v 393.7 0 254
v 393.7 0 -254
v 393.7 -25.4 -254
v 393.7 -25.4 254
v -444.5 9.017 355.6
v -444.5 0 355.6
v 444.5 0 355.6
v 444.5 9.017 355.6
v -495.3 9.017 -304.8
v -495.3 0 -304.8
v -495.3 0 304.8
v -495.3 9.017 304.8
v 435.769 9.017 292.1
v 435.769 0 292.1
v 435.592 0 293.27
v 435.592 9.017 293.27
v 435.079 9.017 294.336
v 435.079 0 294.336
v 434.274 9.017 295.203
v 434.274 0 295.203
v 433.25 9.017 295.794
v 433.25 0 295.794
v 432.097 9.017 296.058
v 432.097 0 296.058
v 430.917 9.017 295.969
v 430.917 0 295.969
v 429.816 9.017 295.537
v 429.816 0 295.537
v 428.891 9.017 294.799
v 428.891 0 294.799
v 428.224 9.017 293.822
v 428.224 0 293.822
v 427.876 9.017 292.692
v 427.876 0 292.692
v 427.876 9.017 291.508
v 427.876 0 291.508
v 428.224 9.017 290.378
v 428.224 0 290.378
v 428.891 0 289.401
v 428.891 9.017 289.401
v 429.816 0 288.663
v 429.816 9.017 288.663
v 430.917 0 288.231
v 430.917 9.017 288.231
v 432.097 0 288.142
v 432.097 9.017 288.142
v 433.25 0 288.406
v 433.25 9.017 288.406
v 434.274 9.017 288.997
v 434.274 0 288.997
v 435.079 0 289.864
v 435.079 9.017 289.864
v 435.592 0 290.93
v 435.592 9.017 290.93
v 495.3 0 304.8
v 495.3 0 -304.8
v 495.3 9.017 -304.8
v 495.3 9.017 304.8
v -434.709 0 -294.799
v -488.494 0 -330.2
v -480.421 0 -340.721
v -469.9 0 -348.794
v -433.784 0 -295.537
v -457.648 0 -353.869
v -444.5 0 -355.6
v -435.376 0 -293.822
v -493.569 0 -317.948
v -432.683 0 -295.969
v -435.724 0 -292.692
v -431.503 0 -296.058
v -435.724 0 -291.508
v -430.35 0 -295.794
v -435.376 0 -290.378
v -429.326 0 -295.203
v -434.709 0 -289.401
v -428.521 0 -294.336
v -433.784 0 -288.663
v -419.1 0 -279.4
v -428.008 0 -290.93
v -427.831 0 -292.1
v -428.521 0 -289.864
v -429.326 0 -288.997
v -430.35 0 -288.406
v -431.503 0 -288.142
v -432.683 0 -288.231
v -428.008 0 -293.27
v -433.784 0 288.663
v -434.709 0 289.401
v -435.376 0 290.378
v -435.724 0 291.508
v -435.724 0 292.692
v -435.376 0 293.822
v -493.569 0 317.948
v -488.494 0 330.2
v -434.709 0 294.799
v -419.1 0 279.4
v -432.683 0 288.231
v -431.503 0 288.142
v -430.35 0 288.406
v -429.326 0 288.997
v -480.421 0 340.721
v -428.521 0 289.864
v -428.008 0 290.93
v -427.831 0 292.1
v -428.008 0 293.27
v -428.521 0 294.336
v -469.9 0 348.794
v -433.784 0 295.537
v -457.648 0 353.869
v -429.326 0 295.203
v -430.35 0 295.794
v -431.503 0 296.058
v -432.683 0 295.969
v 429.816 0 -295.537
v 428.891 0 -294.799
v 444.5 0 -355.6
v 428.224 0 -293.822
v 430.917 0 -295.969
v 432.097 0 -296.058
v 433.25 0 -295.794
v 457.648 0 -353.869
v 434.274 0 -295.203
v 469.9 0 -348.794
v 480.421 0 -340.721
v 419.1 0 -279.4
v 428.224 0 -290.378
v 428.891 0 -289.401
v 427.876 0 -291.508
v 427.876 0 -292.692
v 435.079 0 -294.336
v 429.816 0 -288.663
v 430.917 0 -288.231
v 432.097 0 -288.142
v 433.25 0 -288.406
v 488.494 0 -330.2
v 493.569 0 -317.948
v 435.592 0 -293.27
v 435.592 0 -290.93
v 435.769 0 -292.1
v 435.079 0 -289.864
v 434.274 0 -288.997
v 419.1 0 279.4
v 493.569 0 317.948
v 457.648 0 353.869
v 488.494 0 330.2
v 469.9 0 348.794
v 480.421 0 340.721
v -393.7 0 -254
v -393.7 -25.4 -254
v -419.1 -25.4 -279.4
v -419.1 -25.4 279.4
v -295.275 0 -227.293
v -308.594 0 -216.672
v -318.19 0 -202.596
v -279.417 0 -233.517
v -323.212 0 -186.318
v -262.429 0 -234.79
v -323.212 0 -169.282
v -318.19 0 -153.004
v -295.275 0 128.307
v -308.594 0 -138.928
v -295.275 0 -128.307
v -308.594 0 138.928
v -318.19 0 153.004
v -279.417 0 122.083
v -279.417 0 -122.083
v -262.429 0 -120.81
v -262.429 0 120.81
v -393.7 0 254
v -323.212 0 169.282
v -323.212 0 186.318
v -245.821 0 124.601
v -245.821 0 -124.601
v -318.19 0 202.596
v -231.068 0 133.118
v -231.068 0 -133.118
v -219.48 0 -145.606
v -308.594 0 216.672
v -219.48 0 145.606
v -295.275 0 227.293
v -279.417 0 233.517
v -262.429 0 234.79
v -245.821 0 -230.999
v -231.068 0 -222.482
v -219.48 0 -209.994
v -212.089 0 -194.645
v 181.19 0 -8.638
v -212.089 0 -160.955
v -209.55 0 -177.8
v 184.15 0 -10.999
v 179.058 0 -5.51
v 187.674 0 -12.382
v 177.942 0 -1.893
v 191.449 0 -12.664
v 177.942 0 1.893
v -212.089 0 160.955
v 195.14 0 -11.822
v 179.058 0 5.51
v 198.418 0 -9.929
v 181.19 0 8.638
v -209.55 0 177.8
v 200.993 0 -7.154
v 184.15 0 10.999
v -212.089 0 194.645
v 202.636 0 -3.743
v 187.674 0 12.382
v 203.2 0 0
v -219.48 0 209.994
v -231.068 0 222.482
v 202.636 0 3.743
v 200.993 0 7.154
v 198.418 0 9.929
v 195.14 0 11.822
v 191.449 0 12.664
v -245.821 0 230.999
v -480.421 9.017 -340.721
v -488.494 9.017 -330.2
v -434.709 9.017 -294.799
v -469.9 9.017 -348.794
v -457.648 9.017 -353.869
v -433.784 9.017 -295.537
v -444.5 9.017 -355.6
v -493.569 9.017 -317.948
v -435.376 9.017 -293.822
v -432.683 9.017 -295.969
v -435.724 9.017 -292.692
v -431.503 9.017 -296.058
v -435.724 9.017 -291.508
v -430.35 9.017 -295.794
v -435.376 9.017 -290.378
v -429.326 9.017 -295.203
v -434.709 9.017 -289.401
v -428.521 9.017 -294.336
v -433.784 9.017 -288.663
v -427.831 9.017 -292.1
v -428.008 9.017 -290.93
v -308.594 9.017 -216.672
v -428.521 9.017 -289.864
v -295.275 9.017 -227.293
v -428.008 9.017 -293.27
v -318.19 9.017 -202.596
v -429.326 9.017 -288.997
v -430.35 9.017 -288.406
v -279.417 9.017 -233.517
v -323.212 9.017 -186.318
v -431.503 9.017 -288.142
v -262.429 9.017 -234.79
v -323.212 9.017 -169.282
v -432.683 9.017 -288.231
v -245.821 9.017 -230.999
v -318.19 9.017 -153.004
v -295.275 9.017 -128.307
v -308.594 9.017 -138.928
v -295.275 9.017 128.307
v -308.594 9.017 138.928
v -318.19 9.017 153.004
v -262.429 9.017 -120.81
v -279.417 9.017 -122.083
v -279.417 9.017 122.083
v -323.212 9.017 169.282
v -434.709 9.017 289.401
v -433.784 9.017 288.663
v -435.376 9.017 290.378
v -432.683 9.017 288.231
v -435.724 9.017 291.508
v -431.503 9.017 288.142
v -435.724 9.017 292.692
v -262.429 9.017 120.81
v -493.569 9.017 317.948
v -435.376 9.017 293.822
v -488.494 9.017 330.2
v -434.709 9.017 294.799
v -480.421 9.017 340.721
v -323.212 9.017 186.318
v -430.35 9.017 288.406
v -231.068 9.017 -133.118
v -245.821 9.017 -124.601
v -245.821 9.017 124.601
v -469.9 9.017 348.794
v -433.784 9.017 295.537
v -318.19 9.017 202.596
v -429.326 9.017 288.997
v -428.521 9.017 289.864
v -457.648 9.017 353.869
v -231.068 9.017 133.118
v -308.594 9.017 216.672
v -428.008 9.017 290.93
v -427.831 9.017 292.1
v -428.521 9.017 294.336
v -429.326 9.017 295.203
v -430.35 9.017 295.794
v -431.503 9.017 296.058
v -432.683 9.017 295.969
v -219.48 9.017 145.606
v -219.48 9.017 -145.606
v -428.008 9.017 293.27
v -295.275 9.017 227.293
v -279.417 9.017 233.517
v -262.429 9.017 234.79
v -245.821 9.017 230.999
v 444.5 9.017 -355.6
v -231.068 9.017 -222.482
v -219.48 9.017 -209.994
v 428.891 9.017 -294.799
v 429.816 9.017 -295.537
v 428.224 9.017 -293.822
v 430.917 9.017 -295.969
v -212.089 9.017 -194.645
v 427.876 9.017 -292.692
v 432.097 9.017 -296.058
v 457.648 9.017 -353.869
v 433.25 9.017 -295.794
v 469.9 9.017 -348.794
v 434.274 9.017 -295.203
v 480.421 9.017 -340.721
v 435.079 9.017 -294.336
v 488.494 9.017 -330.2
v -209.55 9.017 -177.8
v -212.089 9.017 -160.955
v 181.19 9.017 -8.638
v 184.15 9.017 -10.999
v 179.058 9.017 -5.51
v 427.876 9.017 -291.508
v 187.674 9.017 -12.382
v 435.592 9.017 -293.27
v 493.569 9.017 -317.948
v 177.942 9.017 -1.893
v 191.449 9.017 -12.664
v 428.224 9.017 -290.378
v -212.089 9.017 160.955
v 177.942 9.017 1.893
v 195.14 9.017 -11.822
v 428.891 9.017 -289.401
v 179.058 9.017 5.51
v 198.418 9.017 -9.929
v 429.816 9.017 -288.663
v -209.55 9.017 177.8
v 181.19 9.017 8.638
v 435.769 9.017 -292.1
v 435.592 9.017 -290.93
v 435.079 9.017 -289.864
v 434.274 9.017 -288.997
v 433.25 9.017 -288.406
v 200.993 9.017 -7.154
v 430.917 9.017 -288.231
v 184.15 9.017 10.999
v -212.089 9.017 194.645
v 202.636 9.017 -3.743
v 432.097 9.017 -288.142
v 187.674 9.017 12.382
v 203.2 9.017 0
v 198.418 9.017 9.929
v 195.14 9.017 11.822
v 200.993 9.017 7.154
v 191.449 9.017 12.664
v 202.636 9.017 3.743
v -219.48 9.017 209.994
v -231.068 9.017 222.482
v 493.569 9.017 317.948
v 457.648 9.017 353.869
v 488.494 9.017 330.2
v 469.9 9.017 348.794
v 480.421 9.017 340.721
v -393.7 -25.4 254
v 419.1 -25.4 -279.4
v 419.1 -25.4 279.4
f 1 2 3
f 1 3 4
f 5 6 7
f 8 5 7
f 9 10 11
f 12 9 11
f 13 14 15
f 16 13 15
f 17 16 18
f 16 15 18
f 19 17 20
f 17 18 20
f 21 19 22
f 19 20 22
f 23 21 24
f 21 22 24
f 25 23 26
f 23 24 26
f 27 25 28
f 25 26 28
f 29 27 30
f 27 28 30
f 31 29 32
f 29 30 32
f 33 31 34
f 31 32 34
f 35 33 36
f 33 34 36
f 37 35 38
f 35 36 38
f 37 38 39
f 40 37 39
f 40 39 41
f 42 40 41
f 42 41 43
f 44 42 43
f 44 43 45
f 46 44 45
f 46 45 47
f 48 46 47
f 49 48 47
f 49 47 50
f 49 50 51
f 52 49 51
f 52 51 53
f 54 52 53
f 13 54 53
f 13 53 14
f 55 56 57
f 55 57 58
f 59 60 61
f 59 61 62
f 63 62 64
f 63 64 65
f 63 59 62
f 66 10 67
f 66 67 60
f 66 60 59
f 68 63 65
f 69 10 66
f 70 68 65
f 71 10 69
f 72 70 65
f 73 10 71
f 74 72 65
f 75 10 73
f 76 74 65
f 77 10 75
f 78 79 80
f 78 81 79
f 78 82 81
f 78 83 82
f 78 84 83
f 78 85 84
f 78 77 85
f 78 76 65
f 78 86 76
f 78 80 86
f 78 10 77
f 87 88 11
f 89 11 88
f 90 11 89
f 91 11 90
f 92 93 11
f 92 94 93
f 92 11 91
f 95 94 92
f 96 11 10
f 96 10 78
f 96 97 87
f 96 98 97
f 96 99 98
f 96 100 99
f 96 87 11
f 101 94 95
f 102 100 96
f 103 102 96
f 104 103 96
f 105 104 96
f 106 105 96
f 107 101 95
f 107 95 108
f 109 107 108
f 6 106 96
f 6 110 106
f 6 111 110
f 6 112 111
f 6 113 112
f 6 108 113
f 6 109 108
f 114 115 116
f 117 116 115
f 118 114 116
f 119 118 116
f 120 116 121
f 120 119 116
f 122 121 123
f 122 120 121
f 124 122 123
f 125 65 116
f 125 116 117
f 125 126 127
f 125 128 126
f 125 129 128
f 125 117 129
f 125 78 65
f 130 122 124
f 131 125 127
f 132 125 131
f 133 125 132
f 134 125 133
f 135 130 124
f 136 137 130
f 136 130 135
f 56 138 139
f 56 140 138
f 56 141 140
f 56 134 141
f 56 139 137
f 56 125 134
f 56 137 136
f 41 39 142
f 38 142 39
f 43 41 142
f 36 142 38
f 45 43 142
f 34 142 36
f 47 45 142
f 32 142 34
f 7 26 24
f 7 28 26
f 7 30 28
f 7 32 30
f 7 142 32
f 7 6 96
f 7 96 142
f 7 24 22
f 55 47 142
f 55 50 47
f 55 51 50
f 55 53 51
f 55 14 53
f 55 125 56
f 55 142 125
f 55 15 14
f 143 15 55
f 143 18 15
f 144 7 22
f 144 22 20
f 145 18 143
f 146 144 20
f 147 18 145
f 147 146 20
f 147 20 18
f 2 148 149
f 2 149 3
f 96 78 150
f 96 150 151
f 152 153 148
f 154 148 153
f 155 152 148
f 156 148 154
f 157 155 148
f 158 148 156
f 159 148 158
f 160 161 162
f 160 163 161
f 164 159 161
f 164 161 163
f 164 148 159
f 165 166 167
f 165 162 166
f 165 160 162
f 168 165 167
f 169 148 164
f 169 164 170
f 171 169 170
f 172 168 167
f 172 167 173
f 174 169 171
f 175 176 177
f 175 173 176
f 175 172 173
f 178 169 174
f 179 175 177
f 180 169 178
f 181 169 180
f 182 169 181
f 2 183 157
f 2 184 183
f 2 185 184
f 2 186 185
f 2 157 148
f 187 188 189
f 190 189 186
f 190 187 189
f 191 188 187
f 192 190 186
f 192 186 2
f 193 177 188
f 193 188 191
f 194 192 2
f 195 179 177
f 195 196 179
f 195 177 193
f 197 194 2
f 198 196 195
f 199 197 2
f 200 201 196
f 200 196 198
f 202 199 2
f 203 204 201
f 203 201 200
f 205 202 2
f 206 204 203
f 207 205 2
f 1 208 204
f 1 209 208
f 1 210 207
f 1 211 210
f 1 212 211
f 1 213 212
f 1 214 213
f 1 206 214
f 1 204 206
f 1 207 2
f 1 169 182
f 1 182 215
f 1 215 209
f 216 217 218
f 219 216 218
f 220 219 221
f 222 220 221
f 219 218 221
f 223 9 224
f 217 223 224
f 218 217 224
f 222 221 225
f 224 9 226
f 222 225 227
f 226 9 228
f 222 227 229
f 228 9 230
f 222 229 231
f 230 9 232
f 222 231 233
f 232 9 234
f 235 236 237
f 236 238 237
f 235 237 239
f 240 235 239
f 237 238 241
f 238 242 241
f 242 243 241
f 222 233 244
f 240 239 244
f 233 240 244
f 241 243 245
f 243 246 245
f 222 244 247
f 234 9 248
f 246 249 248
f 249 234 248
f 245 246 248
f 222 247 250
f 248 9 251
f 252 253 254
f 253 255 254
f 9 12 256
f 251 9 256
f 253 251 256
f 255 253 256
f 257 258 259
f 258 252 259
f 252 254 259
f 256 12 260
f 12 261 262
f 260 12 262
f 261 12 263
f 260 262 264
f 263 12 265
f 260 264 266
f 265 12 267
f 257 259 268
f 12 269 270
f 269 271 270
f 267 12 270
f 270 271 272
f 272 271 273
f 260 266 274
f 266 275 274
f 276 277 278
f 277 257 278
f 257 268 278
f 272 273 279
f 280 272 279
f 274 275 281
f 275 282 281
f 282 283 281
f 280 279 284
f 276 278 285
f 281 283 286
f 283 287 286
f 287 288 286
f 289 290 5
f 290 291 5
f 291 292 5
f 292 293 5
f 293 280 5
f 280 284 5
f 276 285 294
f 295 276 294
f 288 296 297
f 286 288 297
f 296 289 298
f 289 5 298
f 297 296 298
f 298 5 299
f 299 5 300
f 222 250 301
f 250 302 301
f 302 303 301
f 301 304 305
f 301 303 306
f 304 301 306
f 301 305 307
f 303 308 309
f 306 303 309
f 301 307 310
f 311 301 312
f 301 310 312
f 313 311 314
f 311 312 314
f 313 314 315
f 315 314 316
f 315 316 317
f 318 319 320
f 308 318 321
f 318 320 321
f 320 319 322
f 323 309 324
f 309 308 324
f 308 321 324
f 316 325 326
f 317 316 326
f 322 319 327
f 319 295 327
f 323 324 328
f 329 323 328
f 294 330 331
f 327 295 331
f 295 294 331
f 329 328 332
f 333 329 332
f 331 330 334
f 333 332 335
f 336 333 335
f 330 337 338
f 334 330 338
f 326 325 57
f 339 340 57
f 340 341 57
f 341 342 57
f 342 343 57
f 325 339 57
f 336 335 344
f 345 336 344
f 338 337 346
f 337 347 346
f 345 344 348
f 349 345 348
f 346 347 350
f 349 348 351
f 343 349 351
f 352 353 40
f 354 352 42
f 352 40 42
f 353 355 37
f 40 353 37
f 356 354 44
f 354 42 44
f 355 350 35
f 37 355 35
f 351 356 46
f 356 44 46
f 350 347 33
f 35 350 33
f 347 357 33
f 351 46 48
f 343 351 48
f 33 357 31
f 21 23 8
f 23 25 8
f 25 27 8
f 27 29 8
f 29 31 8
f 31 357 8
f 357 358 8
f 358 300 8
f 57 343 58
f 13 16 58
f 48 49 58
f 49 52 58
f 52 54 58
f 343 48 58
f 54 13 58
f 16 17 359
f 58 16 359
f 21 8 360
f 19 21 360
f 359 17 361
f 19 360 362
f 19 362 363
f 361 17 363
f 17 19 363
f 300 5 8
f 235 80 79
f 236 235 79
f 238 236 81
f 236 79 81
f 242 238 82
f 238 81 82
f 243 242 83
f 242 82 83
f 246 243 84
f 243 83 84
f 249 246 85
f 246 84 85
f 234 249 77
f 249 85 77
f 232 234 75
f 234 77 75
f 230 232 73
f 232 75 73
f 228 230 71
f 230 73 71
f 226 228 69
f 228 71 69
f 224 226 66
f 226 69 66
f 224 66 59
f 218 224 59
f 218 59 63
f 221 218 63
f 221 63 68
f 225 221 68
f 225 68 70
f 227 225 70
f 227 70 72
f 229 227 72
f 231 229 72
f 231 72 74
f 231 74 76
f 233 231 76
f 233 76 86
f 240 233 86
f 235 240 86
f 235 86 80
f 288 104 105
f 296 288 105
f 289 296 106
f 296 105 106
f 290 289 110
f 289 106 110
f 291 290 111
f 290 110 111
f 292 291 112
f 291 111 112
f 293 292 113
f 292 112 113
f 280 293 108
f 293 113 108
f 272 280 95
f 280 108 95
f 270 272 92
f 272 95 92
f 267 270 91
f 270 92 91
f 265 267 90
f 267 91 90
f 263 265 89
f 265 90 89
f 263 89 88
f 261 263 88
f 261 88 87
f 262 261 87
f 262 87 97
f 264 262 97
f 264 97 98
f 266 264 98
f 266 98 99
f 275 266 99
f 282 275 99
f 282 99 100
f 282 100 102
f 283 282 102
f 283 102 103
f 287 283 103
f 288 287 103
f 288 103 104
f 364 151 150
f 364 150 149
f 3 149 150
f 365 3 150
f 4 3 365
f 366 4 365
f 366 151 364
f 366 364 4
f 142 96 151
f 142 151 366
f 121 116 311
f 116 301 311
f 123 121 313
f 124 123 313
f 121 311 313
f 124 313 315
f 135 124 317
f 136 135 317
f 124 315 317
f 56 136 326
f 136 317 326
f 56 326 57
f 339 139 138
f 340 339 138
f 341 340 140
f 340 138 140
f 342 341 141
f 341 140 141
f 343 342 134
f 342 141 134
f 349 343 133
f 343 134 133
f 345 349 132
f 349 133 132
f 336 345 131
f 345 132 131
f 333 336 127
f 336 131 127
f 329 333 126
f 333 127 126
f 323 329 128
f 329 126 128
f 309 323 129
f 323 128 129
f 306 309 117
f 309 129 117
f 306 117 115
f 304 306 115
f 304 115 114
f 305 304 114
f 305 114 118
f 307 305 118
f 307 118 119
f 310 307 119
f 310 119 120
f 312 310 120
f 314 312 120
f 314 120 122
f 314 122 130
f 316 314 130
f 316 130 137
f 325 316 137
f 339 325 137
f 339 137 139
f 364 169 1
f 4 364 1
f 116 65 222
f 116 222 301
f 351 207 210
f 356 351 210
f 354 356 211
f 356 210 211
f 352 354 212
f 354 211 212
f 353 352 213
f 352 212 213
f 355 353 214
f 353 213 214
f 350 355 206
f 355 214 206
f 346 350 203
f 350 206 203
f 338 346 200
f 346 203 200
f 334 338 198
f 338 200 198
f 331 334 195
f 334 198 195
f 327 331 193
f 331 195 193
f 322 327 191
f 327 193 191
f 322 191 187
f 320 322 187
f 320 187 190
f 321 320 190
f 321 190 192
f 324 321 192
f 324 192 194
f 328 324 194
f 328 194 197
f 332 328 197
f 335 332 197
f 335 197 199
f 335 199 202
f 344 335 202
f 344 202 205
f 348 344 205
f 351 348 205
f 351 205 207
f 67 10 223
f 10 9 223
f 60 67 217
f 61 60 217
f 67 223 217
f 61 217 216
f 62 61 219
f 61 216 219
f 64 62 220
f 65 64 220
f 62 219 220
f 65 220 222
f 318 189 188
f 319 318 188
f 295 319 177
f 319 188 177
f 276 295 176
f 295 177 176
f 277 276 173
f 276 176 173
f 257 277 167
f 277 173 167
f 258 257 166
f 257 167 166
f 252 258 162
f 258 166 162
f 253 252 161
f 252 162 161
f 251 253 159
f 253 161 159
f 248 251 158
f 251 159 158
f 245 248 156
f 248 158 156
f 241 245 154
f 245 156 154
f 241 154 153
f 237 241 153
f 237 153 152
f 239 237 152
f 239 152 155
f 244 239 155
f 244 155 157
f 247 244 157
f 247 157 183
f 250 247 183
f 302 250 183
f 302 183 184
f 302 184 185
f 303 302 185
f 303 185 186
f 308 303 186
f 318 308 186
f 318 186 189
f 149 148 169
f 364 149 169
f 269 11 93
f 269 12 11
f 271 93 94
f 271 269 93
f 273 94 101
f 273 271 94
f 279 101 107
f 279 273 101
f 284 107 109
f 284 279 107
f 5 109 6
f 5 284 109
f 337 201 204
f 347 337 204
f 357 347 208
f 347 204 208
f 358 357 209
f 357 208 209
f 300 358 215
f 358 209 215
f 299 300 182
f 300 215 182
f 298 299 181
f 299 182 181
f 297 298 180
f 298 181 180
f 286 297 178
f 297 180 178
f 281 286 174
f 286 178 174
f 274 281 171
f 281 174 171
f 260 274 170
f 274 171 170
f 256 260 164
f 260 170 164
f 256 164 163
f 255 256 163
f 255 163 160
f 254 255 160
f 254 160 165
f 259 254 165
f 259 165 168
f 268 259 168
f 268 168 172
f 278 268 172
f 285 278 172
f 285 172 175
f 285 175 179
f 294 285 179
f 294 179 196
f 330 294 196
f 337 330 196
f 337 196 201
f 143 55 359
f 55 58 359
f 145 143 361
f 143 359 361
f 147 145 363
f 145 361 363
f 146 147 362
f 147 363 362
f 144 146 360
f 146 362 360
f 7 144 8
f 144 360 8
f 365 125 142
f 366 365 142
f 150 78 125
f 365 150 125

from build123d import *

# Parameters (mm, degrees)
F0_W      = 990.6
F0_H      = 711.2
F1_DEPTH  = 9.017
F2_R      = 50.8
F3_R      = 3.96875
F4_DEPTH  = 9.018
F5_R      = 12.7
F6_DEPTH  = 9.018
F7_W      = 838.2
F7_H      = 558.8
F7_W_2    = 787.4
F7_H_2    = 508
F8_DEPTH  = 25.4
F9_R      = 57.15
F10_DEPTH = 9.018


with BuildPart() as f1:
    # F0 (on Front) → F1 (new body)
    with BuildSketch(Plane.XZ):
        Rectangle(F0_W, F0_H)
    extrude(amount=-F1_DEPTH)

    # F2
    f2_edges = [f1.edges().sort_by_distance(p)[0] for p in [
        (495.3, 4.5085, 355.6),
        (495.3, 4.5085, -355.6),
        (-495.3, 4.5085, -355.6),
        (-495.3, 4.5085, 355.6),
    ]]
    fillet(f2_edges, radius=F2_R)

    # F3 (on Front) → F4 (cut, through all)
    with BuildSketch(Plane.XZ):
        with Locations((-431.8, 292.1)):
            Circle(F3_R)
        with Locations((431.8, 292.1)):
            Circle(F3_R)
        with Locations((431.8, -292.1)):
            Circle(F3_R)
        with Locations((-431.8, -292.1)):
            Circle(F3_R)
    extrude(amount=-F4_DEPTH, mode=Mode.SUBTRACT)

    # F5 (on Front) → F6 (cut, through all)
    with BuildSketch(Plane.XZ):
        with Locations((190.5, 0)):
            Circle(F5_R)
    extrude(amount=-F6_DEPTH, mode=Mode.SUBTRACT)

    # F7 (on Front) → F8 (join)
    with BuildSketch(Plane.XZ):
        Rectangle(F7_W, F7_H)
        Rectangle(F7_W_2, F7_H_2, mode=Mode.SUBTRACT)
    extrude(amount=F8_DEPTH)

    # F9 (on Front) → F10 (cut, through all)
    with BuildSketch(Plane.XZ):
        with Locations((-266.7, 177.8)):
            Circle(F9_R)
        with Locations((-266.7, -177.8)):
            Circle(F9_R)
    extrude(amount=-F10_DEPTH, mode=Mode.SUBTRACT)


solid = f1.part
